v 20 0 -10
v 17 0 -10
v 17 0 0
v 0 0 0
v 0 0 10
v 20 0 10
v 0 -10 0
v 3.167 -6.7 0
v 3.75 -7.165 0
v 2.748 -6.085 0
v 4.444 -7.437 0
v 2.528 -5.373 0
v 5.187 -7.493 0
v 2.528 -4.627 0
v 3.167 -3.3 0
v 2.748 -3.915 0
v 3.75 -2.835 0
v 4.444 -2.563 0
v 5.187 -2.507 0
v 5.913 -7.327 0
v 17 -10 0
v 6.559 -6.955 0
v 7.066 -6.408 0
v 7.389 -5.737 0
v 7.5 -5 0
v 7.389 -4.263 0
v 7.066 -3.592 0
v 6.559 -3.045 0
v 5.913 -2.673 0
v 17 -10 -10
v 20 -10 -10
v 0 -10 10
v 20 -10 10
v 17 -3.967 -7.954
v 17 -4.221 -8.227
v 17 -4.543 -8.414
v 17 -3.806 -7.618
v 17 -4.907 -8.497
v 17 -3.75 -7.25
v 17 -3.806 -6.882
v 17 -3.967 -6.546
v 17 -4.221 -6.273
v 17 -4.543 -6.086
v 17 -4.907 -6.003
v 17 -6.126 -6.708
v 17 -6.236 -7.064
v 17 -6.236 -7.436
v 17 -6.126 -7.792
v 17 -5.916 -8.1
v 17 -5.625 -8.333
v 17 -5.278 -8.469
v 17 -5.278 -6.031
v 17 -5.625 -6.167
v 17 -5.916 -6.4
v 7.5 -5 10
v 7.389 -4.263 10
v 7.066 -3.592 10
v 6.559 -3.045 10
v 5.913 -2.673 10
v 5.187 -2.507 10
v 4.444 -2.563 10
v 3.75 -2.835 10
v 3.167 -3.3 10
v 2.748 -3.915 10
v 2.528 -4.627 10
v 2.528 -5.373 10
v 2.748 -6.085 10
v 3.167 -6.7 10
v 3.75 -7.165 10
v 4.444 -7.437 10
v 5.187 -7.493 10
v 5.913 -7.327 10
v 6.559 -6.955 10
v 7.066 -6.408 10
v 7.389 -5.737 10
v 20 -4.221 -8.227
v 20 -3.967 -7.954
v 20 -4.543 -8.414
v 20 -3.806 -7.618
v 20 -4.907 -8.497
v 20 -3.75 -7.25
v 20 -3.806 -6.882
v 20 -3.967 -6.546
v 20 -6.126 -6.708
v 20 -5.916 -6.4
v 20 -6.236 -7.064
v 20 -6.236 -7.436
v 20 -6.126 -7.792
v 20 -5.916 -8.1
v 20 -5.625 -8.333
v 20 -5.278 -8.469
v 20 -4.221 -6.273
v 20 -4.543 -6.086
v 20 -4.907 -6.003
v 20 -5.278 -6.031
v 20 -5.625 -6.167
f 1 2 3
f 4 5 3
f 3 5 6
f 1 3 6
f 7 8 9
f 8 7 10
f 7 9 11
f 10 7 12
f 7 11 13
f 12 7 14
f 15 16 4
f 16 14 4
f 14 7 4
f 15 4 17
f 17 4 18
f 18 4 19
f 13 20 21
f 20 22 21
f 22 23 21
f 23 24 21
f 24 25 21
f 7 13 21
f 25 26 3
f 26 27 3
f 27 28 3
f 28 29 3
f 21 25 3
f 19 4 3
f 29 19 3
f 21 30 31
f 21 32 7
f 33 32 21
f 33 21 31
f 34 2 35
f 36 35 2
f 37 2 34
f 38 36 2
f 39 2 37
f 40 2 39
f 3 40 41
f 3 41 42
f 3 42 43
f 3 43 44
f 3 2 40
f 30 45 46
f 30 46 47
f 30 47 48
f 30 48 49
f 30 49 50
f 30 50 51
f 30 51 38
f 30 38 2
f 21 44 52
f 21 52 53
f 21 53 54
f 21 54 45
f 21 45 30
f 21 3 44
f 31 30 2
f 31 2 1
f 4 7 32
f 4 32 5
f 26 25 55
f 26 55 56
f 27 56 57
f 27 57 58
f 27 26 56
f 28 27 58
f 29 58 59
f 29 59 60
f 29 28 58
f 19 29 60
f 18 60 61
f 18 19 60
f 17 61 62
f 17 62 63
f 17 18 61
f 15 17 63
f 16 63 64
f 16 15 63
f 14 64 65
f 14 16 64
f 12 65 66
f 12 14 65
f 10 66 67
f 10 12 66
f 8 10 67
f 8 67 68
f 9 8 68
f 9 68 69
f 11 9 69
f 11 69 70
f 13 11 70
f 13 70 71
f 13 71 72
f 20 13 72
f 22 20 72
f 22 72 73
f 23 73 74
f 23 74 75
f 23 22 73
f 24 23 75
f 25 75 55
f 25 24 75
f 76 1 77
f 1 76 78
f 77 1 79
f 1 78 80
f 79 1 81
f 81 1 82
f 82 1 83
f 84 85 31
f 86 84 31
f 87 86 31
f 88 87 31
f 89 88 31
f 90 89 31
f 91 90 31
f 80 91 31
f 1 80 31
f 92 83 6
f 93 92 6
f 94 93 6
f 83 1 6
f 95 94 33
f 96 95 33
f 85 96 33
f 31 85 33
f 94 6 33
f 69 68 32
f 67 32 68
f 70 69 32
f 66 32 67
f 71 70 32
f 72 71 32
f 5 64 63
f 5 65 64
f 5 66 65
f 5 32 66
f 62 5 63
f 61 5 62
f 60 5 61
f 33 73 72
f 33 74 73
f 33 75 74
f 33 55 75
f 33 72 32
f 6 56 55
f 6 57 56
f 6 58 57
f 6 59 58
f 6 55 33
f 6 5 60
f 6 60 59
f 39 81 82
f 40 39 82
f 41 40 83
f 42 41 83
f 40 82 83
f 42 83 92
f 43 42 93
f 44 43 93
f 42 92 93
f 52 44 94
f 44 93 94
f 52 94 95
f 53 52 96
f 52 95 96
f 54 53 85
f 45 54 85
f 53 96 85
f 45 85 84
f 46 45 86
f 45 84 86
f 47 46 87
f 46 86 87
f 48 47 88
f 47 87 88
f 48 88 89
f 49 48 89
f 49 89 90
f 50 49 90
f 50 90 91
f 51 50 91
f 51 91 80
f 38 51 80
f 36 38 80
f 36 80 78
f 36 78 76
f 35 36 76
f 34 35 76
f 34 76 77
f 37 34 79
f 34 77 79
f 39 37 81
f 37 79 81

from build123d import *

# Parameters (mm, degrees)
F0_W     = 20
F0_H     = 10
F0_R     = 2.5
F1_DEPTH = 10
F2_W     = 3
F2_H     = 10
F3_DEPTH = 10
F4_R     = 1.25
F5_DEPTH = 3


with BuildPart() as f1:
    # F0 (on Top) → F1 (new body)
    with BuildSketch(Plane.XY):
        with Locations((10, -5)):
            Rectangle(F0_W, F0_H)
        with Locations((5, -5)):
            Circle(F0_R, mode=Mode.SUBTRACT)
    extrude(amount=F1_DEPTH)

    # F2 (on face) → F3 (join)
    with BuildSketch(Plane(origin=(0, 0, 0), x_dir=(1, 0, 0), z_dir=(0, 0, -1))):
        with Locations((18.5, 5)):
            Rectangle(F2_W, F2_H)
    extrude(amount=F3_DEPTH)

    # F4 (on face) → F5 (cut, through all)
    with BuildSketch(Plane.YZ.offset(20)):
        with Locations((-5, -7.25)):
            Circle(F4_R)
    extrude(amount=-F5_DEPTH, mode=Mode.SUBTRACT)


solid = f1.part
